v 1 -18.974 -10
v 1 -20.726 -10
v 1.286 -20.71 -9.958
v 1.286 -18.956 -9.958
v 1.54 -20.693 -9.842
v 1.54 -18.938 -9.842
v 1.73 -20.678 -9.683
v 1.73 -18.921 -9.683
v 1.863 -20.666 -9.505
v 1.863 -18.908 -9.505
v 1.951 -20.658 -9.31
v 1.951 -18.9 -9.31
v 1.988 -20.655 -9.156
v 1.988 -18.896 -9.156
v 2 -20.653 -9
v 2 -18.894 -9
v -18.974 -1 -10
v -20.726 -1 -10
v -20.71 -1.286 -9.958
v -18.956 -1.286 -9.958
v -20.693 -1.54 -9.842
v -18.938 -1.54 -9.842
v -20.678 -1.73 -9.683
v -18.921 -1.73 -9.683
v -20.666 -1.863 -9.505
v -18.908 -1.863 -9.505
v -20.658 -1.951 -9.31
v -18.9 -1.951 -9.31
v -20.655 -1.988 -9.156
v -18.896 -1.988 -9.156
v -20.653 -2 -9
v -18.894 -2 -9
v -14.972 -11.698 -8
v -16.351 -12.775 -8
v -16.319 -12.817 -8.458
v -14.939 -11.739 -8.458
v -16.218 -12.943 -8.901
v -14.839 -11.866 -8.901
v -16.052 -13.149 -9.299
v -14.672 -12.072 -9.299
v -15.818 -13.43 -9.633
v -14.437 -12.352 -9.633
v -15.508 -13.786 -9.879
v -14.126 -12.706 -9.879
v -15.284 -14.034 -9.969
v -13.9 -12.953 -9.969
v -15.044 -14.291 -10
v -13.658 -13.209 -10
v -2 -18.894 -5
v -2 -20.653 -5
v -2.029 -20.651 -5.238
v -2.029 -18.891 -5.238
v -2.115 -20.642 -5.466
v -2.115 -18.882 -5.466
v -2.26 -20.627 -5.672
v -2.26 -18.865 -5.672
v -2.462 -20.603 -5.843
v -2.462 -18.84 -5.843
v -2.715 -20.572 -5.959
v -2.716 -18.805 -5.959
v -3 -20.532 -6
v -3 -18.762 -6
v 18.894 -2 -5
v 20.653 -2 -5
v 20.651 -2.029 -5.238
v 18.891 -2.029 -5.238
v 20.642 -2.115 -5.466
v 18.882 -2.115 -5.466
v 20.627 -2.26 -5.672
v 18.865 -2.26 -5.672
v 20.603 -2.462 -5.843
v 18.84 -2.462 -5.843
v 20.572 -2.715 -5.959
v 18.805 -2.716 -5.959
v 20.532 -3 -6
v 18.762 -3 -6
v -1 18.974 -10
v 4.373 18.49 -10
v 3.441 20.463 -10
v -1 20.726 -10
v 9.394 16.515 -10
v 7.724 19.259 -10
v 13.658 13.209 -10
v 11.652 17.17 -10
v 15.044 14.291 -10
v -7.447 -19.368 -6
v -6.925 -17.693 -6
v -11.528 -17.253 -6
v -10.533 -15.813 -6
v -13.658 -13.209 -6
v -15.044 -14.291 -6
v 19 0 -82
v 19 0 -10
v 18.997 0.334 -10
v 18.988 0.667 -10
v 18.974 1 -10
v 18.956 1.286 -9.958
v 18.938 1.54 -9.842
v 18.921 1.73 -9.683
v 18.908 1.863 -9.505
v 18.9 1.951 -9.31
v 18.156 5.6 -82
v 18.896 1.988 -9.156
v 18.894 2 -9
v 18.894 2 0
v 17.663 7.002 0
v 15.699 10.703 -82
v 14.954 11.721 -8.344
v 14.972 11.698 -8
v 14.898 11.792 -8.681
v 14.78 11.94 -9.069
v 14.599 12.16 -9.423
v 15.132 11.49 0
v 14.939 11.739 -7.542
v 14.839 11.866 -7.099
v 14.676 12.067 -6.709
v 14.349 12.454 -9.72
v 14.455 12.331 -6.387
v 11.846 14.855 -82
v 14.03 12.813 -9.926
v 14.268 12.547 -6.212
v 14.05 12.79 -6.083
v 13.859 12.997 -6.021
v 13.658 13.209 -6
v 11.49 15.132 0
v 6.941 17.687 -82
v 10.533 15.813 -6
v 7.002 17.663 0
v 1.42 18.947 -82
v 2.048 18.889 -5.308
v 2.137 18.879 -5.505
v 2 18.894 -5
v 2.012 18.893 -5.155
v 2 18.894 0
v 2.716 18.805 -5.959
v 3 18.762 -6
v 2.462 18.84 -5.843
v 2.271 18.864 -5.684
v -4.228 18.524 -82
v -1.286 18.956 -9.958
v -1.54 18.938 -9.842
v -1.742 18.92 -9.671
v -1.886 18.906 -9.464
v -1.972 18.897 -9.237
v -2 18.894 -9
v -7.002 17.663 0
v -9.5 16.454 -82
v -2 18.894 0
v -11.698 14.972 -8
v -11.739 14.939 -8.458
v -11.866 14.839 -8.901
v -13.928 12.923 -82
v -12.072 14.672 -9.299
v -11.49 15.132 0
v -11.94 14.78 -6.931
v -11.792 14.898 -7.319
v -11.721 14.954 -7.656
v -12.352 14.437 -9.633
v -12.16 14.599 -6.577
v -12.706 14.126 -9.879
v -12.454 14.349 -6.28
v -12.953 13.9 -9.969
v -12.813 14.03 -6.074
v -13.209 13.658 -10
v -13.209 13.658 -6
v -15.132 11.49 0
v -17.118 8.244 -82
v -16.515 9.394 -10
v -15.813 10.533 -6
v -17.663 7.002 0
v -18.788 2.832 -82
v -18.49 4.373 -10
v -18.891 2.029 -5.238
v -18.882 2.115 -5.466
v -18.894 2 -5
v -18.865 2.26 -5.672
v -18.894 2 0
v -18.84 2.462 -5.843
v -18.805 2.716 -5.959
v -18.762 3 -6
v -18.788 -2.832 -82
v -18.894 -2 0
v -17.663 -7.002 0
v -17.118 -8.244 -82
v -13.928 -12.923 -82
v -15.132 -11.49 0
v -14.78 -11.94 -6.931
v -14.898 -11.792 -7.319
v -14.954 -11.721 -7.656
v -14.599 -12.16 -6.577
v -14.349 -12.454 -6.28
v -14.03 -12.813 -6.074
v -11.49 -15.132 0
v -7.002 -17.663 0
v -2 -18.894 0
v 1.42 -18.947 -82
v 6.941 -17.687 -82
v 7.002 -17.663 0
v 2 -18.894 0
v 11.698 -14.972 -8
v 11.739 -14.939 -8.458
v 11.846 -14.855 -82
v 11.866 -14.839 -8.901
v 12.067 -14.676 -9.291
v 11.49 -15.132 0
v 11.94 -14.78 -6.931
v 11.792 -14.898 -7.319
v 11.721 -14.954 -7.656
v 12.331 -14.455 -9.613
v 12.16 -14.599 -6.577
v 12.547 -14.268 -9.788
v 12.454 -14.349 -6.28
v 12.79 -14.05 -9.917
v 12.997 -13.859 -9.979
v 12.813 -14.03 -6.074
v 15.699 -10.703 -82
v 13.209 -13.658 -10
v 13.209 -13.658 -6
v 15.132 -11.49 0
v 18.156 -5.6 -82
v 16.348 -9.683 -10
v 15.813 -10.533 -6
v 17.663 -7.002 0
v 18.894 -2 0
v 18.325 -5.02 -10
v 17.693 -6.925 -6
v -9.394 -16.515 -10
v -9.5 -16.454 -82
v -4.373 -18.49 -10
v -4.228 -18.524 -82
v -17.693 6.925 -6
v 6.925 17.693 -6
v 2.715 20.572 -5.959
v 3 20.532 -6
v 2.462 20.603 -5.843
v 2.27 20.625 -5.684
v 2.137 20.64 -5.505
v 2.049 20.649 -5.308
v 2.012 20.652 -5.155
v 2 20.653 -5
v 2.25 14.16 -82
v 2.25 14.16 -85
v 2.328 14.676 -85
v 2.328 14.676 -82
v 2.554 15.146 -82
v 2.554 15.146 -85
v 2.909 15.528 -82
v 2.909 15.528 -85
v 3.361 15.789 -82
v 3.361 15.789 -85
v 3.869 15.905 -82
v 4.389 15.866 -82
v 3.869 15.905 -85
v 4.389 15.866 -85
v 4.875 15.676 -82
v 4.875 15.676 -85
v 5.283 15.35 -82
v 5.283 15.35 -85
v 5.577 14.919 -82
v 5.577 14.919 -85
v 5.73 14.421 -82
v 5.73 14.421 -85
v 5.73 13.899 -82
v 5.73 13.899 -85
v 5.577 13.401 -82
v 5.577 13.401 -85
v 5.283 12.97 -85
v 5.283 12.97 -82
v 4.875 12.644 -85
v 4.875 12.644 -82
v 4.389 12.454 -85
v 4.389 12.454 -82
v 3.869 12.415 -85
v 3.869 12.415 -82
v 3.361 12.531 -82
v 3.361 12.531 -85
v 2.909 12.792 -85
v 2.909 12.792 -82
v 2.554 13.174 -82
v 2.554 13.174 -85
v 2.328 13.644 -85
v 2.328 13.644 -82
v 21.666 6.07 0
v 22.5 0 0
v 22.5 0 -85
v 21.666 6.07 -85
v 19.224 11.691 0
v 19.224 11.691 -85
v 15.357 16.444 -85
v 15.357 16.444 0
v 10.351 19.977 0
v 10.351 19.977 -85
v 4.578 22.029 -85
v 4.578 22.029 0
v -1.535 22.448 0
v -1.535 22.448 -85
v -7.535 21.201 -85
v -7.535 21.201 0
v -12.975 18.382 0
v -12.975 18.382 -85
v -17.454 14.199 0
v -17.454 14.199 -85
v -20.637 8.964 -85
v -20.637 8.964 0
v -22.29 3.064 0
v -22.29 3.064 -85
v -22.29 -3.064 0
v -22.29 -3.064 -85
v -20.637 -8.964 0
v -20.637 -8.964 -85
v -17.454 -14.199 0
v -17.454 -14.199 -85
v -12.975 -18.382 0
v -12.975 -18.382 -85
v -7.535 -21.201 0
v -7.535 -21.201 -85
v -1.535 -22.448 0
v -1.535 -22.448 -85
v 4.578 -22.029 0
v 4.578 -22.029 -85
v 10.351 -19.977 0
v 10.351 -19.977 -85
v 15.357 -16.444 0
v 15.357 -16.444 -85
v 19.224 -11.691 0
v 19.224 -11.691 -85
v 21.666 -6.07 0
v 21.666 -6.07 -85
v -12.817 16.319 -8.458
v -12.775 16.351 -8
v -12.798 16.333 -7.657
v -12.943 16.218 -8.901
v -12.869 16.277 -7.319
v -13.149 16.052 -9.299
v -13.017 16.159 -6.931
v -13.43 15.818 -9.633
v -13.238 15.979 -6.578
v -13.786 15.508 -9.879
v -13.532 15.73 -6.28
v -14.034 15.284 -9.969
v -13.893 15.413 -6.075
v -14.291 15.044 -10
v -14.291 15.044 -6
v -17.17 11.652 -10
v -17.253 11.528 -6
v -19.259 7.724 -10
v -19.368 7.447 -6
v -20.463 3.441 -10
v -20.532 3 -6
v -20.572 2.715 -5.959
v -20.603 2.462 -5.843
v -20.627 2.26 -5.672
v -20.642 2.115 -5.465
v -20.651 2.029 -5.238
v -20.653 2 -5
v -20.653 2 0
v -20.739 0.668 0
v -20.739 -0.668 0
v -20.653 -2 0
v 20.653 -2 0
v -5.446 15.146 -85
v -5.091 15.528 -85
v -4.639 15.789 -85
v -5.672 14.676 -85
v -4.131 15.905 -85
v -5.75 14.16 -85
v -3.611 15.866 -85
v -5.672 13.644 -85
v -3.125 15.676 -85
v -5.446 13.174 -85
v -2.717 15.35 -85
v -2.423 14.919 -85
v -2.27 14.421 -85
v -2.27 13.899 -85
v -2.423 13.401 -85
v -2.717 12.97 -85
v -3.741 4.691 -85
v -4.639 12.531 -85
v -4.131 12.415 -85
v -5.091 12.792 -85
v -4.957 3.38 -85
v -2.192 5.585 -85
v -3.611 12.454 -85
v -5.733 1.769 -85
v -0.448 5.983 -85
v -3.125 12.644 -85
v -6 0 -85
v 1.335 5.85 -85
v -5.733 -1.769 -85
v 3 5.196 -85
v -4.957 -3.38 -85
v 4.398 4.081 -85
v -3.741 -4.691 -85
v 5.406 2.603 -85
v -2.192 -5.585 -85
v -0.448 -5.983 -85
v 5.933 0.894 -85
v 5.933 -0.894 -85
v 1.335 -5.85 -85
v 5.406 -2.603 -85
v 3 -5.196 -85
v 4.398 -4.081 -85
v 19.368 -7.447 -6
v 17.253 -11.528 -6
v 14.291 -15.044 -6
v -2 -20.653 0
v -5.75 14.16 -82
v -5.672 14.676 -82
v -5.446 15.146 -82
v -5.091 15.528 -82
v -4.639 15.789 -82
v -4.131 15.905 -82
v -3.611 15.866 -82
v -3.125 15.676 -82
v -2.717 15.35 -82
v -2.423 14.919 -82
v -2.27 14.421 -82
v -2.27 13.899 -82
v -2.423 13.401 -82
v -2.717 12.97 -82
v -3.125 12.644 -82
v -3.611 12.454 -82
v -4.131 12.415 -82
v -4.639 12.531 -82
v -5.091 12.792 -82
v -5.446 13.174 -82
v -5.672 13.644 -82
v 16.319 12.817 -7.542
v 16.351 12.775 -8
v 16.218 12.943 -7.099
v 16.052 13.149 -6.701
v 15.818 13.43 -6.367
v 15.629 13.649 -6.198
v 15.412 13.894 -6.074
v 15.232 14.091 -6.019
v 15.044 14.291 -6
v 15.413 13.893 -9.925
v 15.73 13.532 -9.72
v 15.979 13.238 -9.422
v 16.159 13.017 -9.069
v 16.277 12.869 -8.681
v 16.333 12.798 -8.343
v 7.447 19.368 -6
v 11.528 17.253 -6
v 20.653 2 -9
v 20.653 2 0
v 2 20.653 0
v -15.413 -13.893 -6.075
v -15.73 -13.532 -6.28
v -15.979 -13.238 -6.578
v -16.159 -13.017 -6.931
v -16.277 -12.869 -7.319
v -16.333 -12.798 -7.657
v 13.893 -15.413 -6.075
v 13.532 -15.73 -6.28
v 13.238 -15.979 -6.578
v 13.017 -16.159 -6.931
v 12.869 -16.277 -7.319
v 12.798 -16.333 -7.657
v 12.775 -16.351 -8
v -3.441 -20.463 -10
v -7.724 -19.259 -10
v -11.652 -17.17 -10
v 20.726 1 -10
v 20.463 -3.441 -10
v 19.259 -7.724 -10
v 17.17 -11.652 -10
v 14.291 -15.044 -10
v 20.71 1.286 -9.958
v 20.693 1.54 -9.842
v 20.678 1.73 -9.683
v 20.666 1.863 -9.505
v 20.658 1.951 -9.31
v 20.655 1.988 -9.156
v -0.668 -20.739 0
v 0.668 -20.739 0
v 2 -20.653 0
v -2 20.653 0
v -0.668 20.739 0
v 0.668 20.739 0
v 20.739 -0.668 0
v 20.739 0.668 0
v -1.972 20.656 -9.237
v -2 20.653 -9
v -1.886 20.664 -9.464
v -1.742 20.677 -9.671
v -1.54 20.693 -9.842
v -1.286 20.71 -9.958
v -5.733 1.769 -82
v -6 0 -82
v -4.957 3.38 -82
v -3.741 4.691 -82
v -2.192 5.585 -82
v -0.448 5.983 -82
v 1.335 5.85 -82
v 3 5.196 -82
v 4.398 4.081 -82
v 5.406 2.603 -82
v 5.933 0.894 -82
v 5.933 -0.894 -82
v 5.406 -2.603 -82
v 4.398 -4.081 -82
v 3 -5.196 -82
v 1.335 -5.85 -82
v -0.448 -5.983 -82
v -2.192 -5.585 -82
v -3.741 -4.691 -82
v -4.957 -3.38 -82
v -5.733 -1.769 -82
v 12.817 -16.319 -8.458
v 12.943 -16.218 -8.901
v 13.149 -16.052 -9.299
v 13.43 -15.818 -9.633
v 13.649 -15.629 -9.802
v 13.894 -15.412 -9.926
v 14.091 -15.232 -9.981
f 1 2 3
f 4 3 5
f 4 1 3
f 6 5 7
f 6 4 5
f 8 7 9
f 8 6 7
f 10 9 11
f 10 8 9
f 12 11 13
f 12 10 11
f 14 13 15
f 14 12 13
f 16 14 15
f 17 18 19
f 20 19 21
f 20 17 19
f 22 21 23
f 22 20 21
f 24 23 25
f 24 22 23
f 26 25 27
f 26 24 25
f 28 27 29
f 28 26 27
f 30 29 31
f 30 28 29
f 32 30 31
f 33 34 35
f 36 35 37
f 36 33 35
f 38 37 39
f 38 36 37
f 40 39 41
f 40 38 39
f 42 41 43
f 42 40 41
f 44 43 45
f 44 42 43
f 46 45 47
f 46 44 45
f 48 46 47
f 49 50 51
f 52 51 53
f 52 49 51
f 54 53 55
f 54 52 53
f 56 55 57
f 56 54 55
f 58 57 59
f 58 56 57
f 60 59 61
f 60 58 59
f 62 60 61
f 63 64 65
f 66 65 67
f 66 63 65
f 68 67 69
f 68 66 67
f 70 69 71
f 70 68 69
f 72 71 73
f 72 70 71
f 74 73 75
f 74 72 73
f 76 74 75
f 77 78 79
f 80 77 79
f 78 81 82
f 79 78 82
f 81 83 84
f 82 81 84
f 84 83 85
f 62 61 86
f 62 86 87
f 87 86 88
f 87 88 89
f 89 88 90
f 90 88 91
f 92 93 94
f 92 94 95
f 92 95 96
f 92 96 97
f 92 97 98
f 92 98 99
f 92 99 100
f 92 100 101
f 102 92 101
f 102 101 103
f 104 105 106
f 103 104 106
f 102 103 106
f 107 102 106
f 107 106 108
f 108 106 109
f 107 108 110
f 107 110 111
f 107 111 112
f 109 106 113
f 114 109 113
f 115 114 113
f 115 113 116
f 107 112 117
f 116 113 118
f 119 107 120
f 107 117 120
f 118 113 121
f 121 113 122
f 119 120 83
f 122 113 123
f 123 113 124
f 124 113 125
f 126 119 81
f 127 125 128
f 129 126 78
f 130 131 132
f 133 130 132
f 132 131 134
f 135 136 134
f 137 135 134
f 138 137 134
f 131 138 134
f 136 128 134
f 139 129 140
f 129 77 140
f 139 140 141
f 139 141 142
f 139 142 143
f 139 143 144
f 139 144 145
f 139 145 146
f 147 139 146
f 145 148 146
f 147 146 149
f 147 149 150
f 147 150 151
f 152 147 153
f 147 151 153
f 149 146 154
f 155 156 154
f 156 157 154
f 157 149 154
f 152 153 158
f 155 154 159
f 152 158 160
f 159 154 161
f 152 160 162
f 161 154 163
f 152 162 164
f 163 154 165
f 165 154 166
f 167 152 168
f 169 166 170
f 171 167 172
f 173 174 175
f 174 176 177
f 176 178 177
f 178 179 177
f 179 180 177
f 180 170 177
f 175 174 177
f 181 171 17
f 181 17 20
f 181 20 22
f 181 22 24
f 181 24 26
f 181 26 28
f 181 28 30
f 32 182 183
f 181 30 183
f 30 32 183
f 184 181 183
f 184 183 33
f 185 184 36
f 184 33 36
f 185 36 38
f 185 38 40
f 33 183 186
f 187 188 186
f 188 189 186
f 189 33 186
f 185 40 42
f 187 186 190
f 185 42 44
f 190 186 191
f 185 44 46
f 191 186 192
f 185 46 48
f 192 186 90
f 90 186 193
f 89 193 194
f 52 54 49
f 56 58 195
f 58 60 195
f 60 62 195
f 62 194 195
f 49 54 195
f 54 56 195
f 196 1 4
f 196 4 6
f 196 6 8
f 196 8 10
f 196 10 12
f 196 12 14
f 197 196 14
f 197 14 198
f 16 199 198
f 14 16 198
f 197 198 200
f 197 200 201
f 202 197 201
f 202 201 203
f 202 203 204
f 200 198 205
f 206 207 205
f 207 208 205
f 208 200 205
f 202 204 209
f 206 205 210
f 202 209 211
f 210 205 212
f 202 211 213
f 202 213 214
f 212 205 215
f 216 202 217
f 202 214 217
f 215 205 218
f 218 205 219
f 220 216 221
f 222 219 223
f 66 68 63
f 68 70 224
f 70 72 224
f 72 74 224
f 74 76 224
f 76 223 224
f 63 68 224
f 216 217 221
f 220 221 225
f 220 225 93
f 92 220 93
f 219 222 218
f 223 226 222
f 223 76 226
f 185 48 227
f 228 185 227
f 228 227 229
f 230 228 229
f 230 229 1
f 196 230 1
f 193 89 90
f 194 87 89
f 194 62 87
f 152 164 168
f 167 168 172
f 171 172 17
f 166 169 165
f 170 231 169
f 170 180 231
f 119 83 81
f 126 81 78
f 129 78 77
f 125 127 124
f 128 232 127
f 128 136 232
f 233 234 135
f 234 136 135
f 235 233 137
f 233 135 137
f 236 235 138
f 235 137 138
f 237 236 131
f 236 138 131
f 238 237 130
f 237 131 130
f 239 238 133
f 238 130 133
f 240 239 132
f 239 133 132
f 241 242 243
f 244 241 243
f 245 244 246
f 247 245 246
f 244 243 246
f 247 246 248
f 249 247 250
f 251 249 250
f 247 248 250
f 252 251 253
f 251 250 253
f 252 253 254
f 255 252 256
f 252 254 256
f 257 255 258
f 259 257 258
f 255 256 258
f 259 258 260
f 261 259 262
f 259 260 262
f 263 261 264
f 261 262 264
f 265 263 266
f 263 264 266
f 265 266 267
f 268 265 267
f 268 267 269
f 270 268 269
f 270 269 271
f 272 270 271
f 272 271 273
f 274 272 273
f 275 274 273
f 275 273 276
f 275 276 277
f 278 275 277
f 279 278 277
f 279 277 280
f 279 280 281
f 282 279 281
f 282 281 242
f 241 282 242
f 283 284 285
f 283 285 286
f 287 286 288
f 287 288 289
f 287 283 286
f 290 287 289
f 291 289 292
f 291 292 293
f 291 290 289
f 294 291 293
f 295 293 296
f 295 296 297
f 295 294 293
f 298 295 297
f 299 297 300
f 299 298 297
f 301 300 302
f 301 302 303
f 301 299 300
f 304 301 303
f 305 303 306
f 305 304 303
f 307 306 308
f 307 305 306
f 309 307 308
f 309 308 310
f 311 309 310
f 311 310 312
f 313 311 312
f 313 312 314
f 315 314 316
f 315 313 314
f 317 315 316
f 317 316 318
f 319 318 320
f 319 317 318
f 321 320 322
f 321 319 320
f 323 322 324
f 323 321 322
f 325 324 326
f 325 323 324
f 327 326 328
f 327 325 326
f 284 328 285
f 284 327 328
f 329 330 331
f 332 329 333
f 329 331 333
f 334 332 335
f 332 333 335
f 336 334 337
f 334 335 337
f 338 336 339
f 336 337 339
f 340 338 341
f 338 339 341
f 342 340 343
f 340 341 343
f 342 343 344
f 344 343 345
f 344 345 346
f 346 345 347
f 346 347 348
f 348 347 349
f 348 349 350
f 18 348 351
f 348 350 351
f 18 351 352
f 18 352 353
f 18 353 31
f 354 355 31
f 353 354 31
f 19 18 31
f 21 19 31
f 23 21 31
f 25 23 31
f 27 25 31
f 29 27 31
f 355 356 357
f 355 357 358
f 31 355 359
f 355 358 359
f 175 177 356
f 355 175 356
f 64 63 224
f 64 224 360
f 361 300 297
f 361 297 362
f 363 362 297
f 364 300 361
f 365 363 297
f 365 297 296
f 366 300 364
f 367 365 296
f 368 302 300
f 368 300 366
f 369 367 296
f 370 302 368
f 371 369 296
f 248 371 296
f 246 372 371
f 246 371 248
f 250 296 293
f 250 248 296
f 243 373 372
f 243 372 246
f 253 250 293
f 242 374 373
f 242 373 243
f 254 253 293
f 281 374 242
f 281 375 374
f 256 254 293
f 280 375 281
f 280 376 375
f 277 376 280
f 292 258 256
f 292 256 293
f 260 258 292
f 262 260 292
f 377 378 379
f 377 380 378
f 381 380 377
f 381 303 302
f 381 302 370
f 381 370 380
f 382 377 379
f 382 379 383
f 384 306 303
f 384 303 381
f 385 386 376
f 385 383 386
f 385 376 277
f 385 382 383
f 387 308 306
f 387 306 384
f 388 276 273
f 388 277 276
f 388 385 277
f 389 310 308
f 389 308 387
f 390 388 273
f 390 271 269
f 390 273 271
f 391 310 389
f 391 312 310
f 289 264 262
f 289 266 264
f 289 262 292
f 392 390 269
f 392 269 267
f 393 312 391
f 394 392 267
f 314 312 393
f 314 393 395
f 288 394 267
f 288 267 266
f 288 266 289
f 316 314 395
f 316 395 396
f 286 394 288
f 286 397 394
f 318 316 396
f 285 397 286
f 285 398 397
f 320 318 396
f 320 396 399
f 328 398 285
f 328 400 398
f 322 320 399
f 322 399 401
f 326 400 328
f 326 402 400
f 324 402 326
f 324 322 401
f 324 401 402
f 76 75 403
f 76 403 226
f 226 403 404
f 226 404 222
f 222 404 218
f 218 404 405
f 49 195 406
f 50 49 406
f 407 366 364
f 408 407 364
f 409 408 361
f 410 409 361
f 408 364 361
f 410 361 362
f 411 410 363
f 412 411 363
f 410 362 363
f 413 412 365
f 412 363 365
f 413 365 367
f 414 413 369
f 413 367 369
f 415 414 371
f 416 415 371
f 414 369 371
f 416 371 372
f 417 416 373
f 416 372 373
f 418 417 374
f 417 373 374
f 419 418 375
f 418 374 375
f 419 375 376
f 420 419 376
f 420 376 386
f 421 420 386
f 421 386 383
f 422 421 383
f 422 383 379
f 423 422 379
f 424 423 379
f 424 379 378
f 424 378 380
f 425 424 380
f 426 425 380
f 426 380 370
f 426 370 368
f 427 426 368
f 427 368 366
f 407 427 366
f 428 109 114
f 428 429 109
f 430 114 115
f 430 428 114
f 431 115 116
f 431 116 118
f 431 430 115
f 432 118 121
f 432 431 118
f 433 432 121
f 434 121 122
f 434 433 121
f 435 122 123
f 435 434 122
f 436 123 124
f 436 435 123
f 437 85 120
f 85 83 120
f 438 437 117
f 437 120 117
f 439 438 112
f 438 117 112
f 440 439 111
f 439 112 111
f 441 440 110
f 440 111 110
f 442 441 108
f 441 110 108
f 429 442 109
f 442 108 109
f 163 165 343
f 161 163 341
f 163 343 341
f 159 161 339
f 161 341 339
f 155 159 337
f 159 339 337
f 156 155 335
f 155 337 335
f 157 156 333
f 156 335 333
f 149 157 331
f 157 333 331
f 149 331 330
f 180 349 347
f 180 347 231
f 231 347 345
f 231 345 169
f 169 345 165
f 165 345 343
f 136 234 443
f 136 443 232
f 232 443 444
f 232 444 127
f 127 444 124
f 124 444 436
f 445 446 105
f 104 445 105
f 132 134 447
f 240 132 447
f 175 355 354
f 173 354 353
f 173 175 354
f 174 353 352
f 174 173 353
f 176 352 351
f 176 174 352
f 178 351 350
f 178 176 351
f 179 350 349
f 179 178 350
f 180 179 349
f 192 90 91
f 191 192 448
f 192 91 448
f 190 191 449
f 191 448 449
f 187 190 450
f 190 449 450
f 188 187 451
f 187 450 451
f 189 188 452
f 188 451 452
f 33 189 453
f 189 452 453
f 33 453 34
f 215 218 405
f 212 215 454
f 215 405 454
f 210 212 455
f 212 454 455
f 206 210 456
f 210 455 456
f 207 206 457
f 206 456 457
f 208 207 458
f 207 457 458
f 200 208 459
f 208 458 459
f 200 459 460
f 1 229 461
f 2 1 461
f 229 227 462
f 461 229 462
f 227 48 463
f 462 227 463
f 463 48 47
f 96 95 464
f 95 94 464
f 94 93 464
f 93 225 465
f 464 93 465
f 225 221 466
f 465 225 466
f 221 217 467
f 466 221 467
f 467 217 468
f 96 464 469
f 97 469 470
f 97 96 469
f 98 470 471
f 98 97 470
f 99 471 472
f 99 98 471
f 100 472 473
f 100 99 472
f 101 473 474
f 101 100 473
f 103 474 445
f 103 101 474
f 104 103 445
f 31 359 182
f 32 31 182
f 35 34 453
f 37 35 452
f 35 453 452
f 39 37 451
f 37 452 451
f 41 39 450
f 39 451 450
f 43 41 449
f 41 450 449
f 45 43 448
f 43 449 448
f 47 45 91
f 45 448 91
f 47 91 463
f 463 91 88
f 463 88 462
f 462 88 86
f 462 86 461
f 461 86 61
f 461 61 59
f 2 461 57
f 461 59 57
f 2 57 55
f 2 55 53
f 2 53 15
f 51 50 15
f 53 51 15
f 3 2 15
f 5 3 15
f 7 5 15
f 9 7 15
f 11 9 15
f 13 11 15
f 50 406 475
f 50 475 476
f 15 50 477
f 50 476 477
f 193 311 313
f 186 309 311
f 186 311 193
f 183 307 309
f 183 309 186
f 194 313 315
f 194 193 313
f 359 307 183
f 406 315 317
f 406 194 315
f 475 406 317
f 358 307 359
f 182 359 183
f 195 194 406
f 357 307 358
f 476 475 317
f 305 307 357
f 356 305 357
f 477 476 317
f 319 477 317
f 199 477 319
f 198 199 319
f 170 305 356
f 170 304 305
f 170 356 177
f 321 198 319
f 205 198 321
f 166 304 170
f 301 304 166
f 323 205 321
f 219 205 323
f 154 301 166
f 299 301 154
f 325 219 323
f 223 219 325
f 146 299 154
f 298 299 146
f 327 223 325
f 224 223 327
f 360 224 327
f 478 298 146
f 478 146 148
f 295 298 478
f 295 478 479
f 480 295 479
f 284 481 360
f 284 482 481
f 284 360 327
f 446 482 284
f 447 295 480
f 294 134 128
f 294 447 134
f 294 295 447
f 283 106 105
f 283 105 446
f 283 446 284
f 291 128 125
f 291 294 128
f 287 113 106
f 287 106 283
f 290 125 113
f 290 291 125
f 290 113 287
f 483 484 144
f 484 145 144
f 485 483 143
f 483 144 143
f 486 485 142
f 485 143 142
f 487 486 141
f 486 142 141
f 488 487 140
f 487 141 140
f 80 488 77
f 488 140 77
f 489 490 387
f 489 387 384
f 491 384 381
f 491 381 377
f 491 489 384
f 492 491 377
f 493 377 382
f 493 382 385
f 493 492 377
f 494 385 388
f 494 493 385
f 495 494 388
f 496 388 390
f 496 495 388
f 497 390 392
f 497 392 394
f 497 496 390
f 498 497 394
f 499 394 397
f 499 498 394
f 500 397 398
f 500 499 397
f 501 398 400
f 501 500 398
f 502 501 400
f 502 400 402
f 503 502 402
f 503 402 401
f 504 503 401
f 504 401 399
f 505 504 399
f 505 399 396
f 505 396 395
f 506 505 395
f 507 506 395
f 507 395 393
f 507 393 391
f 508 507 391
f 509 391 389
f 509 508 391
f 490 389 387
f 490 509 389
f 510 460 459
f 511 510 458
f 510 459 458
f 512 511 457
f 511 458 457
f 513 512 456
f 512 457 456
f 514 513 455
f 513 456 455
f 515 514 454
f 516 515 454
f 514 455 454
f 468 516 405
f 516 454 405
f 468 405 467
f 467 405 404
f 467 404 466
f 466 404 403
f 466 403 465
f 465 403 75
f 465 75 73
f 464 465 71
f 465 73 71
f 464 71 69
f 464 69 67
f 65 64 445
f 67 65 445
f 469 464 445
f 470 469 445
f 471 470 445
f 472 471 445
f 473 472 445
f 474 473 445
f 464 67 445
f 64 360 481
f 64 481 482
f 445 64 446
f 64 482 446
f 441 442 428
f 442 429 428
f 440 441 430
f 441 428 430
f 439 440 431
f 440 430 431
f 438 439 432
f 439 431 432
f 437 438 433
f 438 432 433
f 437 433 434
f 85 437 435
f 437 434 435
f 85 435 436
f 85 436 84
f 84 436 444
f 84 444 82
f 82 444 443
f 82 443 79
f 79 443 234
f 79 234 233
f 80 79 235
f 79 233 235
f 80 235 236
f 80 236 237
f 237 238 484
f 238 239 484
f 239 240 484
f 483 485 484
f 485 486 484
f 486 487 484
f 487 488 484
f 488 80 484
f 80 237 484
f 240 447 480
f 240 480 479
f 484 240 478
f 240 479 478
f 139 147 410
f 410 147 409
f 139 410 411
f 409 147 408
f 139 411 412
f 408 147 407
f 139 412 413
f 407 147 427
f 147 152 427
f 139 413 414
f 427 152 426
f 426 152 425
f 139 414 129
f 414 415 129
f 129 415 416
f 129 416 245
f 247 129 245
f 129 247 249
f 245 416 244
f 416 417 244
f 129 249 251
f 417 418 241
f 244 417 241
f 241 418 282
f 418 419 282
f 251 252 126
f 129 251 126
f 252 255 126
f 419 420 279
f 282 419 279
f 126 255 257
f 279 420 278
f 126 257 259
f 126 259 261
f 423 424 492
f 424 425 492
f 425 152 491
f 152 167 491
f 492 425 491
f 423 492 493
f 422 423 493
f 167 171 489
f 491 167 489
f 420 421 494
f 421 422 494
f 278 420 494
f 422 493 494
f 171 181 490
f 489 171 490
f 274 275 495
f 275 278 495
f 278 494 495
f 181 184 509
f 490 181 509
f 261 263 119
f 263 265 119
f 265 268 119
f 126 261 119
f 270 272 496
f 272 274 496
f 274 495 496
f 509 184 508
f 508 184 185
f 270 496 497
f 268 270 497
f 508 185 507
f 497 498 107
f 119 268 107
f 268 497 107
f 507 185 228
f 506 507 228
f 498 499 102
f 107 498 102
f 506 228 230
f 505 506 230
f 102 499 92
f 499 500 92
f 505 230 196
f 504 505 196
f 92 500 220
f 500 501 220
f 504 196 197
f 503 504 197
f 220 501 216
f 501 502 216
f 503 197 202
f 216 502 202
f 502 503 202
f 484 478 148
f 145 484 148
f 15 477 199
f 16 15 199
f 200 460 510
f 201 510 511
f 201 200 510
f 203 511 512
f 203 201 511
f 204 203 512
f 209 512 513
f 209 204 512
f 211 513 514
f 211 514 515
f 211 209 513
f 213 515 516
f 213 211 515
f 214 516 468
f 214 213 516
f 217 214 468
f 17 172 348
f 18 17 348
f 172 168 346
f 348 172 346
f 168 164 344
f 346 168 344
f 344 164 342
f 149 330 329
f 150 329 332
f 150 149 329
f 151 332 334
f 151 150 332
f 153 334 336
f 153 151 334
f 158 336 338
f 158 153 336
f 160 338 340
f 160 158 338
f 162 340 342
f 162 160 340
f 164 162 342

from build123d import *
from OCP.BRepFilletAPI import BRepFilletAPI_MakeFillet

# Parameters (mm, degrees)
SKETCH1_R                  = 22.5
SKETCH1_R_2                = 19
BOSS_EXTRUDE2_DEPTH        = 85
BOSS_EXTRUDE5_START        = -3
SKETCH3_R                  = 19
SKETCH3_R_2                = 6
BOSS_EXTRUDE5_DEPTH        = 3
CUT_EXTRUDE1_DEPTH         = 10
CUT_REVOLVE2_ANGLE         = 52.00000000000012
FILLET2_R                  = 2
FILLET2_R_2                = 1
CIRPATTERN1_COUNT          = 4
FILLET2_OF_CIRPATTERN1_R   = 2
FILLET2_OF_CIRPATTERN1_R_2 = 1
SKETCH17_R                 = 1.7499999999999998
CUT_EXTRUDE2_DEPTH         = 10


with BuildPart() as part:
    # Sketch1 → Boss-Extrude2 (new body)
    with BuildSketch(Plane.XY):
        Circle(SKETCH1_R)
        Circle(SKETCH1_R_2, mode=Mode.SUBTRACT)
    extrude(amount=-BOSS_EXTRUDE2_DEPTH)

    # Sketch3 → Boss-Extrude5 (add)
    with BuildSketch(Plane(origin=(0, 0, -85), x_dir=(-1, 0, 0), z_dir=(0, 0, -1)).offset(BOSS_EXTRUDE5_START)):
        with Locations(Location((0, 0, 0), (0, 0, 180))):
            Circle(SKETCH3_R)
        Circle(SKETCH3_R_2, mode=Mode.SUBTRACT)
    extrude(amount=BOSS_EXTRUDE5_DEPTH)

    # Sketch4 → Cut-Extrude1 (cut)
    with BuildSketch(Plane.XY):
        with BuildLine():
            ThreePointArc((1.999999999999999, 20.653389552322885), (1.27e-15, 20.75), (-2.000000000000001, 20.65338955232288))
            Line((-2, 20.65338955232288), (-2, 18.894443627691185))
            ThreePointArc((-2.000000000000001, 18.894443627691185), (1.16e-15, 19), (1.999999999999999, 18.894443627691185))
            Line((2, 18.894443627691185), (2, 20.65338955232288))
        make_face()
    cut_extrude1 = extrude(amount=-CUT_EXTRUDE1_DEPTH, mode=Mode.SUBTRACT)

    # Sketch8 → Cut-Revolve2 (revolve, cut)
    with BuildSketch(Plane(origin=(0, 0, 0), x_dir=(0, 0, -1), z_dir=(1, 0, 0))):
        Polygon((6.000000000000001, 20.75), (10, 20.75), (10, 18.9), (6.000000000000002, 18.9), align=None)
    cut_revolve2 = revolve(axis=Axis((0, 0, 0), (0, 0, -1)), revolution_arc=CUT_REVOLVE2_ANGLE, mode=Mode.SUBTRACT)

    # Fillet2
    fillet2_edges_1 = [part.edges().sort_by_distance(p)[0] for p in [
        (15.661713727933623, 12.236271822097425, -6.000000000000001),
        (15.661713727933623, 12.236271822097425, -10),
    ]]
    fillet2_edges_2 = [part.edges().sort_by_distance(p)[0] for p in [
        (-2, 19.773916590007033, -10),
        (2, 19.773916590007033, -6.000000000000002),
    ]]
    fillet2 = BRepFilletAPI_MakeFillet(part.part.solid().wrapped)
    for e in fillet2_edges_1:
        fillet2.Add(FILLET2_R - 0.0001, e.wrapped)
    for e in fillet2_edges_2:
        fillet2.Add(FILLET2_R_2 - 0.0001, e.wrapped)
    add(Compound.cast(fillet2.Shape()), mode=Mode.REPLACE)  # a hair under: the kernel refuses the full size

    # CirPattern1: Cut-Extrude1, Cut-Revolve2 ×4 about axis
    cirpattern1_axis = Axis((0, 0, 0), (0, 0, 1))
    add([cut_extrude1.rotate(cirpattern1_axis, i * 360 / CIRPATTERN1_COUNT) for i in range(1, CIRPATTERN1_COUNT)], mode=Mode.SUBTRACT)
    add([cut_revolve2.rotate(cirpattern1_axis, i * 360 / CIRPATTERN1_COUNT) for i in range(1, CIRPATTERN1_COUNT)], mode=Mode.SUBTRACT)

    # Fillet2 of CirPattern1
    fillet2_of_cirpattern1_edges_1 = [part.edges().sort_by_distance(p)[0] for p in [
        (-12.236271822097423, 15.661713727933625, -6.000000000000001),
        (-12.236271822097423, 15.661713727933627, -10),
        (-15.661713727933625, -12.236271822097423, -6.000000000000001),
        (-15.661713727933627, -12.236271822097423, -10),
        (12.236271822097422, -15.661713727933629, -6.000000000000001),
        (12.236271822097422, -15.661713727933627, -10),
    ]]
    fillet2_of_cirpattern1_edges_2 = [part.edges().sort_by_distance(p)[0] for p in [
        (-19.773916590007033, -1.9999999999999978, -10),
        (-19.773916590007033, 2.000000000000002, -6.000000000000002),
        (1.9999999999999976, -19.773916590007033, -10),
        (-2.000000000000002, -19.773916590007033, -6.000000000000002),
        (19.773916590007033, 1.9999999999999956, -10),
        (19.773916590007033, -2.000000000000004, -6.000000000000002),
    ]]
    fillet2_of_cirpattern1 = BRepFilletAPI_MakeFillet(part.part.solid().wrapped)
    for e in fillet2_of_cirpattern1_edges_1:
        fillet2_of_cirpattern1.Add(FILLET2_OF_CIRPATTERN1_R - 0.0001, e.wrapped)
    for e in fillet2_of_cirpattern1_edges_2:
        fillet2_of_cirpattern1.Add(FILLET2_OF_CIRPATTERN1_R_2 - 0.0001, e.wrapped)
    add(Compound.cast(fillet2_of_cirpattern1.Shape()), mode=Mode.REPLACE)  # a hair under: the kernel refuses the full size

    # Sketch17 → Cut-Extrude2 (cut)
    with BuildSketch(Plane(origin=(0, 0, -85), x_dir=(-1, 0, 0), z_dir=(0, 0, -1))):
        with Locations((-4, 14.16)):
            Circle(SKETCH17_R)
        with Locations((4, 14.16)):
            Circle(SKETCH17_R)
    extrude(amount=-CUT_EXTRUDE2_DEPTH, mode=Mode.SUBTRACT)


solid = part.part
